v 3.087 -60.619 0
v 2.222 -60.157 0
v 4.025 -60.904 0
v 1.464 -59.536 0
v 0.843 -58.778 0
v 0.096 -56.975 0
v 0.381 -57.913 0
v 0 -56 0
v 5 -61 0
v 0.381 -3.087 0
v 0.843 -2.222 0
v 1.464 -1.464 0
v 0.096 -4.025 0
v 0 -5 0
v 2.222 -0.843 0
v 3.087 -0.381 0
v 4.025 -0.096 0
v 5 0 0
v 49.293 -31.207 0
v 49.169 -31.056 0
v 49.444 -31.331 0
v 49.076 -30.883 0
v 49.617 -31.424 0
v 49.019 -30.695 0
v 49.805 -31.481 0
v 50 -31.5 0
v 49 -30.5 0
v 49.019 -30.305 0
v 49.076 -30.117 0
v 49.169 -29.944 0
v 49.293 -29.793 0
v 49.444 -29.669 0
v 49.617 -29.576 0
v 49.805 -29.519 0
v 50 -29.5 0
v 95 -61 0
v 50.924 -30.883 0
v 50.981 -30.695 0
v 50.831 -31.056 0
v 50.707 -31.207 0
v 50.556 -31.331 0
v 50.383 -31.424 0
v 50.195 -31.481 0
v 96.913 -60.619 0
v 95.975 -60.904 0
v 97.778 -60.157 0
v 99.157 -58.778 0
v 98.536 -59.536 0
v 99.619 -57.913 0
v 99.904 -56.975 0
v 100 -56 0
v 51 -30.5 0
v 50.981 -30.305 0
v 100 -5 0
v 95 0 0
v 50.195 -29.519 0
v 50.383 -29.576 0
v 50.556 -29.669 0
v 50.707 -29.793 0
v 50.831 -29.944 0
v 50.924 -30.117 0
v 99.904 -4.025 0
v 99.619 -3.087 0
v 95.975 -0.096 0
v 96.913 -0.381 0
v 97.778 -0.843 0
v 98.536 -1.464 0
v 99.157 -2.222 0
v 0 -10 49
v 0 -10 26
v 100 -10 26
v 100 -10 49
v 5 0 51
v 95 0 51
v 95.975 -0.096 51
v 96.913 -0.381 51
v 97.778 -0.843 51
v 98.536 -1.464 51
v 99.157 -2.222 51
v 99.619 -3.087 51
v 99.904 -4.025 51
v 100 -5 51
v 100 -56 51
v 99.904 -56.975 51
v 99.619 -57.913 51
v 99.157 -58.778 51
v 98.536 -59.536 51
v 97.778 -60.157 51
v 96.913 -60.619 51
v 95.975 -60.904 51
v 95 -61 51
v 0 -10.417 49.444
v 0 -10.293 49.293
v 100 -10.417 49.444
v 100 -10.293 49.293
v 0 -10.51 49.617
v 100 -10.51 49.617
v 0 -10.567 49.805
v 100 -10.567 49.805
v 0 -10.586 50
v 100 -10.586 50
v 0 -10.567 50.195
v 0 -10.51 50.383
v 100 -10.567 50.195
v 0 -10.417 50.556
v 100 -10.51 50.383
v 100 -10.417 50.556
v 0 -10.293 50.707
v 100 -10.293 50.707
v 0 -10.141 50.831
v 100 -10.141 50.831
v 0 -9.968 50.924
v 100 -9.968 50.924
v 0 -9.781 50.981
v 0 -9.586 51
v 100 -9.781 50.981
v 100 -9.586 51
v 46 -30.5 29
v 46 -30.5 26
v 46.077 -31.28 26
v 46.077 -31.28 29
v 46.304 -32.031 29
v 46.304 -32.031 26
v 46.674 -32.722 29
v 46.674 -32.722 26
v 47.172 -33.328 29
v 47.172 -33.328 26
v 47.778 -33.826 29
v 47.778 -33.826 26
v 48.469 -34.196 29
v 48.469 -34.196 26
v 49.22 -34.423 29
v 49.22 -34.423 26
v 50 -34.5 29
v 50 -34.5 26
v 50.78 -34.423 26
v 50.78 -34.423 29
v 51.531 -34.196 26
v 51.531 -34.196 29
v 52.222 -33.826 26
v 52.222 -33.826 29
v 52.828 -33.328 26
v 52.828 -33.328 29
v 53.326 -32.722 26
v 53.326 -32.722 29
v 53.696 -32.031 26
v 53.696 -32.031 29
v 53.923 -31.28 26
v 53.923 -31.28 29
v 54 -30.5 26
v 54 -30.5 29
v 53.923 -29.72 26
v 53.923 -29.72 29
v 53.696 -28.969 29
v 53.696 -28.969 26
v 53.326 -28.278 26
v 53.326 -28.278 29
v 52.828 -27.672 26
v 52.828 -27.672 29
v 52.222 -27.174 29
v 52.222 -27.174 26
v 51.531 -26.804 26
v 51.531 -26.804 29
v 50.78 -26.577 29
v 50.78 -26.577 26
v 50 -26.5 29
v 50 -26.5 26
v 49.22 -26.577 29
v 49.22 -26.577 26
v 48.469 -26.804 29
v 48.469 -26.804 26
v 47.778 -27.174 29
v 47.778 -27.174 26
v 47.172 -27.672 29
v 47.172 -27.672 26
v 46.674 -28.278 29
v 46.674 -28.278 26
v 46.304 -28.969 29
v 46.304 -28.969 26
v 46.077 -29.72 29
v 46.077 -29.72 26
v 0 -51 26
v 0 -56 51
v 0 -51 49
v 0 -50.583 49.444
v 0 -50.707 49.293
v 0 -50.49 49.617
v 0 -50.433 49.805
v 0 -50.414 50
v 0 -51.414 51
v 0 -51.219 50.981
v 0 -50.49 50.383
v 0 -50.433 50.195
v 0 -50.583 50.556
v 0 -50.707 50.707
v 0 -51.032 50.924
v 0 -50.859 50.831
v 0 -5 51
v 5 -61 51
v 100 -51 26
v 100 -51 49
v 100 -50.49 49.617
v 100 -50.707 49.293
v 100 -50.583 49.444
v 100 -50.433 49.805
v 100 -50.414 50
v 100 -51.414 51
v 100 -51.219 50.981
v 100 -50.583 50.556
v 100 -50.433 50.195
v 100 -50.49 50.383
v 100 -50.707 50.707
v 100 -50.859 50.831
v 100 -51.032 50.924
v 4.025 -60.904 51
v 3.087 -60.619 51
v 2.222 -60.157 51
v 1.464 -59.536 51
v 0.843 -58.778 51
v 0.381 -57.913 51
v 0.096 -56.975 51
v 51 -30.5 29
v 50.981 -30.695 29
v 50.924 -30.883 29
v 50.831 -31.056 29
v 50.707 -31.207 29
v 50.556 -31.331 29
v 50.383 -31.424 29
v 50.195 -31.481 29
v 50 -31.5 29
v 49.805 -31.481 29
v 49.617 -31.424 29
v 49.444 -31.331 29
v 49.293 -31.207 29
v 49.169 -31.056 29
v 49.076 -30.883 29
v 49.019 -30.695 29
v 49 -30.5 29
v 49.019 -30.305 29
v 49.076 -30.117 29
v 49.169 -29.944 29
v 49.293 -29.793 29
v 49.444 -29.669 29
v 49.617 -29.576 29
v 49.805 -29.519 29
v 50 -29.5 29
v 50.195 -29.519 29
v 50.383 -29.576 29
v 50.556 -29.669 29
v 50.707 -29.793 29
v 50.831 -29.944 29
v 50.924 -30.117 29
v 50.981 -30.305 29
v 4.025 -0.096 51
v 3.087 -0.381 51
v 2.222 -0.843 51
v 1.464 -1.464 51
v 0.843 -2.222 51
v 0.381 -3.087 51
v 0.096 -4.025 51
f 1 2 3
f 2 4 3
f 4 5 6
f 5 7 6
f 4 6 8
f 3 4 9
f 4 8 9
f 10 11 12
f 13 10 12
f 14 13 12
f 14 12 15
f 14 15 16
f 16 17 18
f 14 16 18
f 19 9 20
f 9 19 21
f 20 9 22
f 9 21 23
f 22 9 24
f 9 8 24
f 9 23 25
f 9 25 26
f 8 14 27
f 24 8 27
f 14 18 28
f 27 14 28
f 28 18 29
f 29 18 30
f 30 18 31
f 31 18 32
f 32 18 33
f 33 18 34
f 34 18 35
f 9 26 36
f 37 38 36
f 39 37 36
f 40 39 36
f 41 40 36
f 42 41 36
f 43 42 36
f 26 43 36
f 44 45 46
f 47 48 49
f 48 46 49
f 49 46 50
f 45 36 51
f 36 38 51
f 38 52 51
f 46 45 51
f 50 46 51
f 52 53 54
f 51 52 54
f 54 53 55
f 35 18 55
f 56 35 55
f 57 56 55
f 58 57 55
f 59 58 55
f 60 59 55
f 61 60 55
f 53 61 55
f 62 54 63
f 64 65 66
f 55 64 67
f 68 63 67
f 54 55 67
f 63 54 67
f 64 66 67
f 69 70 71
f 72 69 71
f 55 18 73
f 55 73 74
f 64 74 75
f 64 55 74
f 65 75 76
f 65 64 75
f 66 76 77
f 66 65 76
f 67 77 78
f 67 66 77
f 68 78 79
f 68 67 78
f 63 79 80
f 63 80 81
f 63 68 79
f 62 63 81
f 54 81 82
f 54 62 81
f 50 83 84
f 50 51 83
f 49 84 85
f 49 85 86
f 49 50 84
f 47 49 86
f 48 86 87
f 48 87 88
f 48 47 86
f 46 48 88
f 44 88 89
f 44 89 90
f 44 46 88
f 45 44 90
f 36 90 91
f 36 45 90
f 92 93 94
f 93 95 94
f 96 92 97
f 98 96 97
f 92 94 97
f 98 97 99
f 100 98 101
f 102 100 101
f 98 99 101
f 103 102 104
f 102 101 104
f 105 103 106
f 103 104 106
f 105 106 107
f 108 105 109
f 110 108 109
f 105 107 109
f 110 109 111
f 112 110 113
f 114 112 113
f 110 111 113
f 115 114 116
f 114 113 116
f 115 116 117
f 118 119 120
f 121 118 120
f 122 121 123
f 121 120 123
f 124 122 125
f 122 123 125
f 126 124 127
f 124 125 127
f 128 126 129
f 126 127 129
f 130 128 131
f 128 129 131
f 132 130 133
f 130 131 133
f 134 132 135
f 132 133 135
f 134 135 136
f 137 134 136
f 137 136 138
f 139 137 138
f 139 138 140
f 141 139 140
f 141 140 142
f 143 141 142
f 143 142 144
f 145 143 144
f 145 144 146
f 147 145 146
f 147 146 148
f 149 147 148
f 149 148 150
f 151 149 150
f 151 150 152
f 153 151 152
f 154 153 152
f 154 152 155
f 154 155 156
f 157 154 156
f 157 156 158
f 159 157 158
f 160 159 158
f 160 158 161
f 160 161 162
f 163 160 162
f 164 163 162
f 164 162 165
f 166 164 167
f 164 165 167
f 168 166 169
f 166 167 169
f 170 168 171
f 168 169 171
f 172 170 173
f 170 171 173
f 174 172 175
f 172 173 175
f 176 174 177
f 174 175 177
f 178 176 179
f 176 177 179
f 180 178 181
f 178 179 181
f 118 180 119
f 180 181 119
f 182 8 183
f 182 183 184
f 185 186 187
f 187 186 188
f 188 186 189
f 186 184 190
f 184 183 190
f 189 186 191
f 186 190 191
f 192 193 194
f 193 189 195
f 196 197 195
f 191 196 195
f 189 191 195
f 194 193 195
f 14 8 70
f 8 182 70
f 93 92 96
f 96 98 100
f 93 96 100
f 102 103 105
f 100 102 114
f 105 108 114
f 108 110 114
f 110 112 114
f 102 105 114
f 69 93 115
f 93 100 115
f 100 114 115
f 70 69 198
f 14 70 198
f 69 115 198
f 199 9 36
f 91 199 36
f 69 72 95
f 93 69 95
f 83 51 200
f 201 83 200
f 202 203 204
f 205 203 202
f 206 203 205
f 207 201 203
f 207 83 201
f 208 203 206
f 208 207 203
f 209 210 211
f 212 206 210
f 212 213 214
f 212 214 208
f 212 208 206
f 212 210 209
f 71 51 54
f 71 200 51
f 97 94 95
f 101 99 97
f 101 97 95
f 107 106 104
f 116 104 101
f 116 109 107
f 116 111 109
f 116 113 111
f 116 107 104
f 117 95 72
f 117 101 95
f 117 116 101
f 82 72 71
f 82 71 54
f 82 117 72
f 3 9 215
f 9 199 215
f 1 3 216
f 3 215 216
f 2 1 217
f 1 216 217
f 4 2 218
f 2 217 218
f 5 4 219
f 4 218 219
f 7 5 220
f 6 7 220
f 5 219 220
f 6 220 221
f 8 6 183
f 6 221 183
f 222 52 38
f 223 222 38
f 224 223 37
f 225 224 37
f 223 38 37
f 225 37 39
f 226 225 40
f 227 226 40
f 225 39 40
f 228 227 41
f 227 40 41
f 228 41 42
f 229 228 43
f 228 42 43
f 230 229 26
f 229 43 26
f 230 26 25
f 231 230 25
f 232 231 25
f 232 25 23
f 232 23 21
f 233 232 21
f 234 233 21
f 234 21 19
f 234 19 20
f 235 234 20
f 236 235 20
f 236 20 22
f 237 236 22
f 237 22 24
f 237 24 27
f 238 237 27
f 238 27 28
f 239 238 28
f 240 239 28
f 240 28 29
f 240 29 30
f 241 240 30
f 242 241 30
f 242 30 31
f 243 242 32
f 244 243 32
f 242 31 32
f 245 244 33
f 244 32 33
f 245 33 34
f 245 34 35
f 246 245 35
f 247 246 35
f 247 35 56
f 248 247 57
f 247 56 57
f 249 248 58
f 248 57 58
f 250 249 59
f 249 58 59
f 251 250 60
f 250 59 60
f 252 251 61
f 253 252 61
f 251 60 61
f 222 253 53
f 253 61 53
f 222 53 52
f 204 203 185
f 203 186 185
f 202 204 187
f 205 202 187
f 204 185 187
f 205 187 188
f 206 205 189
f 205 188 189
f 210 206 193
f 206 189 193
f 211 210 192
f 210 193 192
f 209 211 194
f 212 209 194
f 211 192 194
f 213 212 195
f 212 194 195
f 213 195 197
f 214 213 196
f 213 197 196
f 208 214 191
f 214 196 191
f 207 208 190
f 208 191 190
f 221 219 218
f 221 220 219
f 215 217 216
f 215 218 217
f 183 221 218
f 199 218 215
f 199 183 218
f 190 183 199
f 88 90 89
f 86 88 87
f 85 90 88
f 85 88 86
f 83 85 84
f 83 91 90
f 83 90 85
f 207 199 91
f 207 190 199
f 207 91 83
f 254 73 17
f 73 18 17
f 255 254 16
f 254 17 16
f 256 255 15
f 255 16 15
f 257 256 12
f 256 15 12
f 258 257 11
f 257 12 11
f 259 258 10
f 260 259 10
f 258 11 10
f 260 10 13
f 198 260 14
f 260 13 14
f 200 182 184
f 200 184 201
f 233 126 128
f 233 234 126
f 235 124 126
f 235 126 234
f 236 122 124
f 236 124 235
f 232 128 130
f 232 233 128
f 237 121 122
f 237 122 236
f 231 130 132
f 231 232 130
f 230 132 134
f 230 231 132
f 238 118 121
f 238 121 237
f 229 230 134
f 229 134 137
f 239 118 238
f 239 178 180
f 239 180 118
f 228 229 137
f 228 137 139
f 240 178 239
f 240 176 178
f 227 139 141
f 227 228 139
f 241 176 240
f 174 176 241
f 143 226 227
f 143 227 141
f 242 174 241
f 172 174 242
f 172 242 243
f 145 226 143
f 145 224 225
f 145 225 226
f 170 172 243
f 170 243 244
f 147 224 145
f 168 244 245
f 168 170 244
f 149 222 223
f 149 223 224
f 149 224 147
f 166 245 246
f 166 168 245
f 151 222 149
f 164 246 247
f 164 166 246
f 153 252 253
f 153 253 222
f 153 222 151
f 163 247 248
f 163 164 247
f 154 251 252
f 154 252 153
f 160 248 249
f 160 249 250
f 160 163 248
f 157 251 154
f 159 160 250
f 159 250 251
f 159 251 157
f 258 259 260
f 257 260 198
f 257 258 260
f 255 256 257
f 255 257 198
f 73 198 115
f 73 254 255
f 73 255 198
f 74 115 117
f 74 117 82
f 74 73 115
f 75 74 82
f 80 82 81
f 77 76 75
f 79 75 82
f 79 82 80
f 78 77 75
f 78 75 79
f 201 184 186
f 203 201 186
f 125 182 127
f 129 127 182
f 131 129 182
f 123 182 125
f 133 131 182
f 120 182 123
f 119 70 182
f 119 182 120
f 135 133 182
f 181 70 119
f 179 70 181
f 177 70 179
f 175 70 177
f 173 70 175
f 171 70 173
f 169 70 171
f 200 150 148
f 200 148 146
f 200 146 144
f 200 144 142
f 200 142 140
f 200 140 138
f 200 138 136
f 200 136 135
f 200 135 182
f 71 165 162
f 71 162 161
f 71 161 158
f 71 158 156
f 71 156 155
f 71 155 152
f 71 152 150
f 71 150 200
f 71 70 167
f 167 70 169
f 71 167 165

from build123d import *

# Parameters (mm, degrees)
F0_W         = 100
F0_H         = 10
F1_DEPTH     = 51
F2_DEPTH     = 26
F3_DEPTH     = 29
F4_R         = 5
F5_W         = 100
F5_H         = 3
F6_DEPTH     = 2
F7_T4_DEPTH  = 115.4300979278
F8_W         = 100
F8_H         = 3
F9_DEPTH     = 2
F10_T4_DEPTH = 115.4300979278
F11_R        = 1


# Not quite as in the source:
# - a fillet or chamfer that OpenCascade refuses, or shapes differently, is made with other operations: its cross-section is extruded or revolved along the edge and cut away or added


with BuildPart() as f1:
    # F0 (on Top) → F1 (new body)
    with BuildSketch(Plane.XY):
        with Locations((50, -5)):
            Rectangle(F0_W, F0_H)
    extrude(amount=F1_DEPTH)



with BuildPart() as f1b:
    # F0 (on Top) → F1, piece 2 (new body)
    with BuildSketch(Plane.XY):
        with Locations((50, -56)):
            Rectangle(F0_W, F0_H)
    extrude(amount=F1_DEPTH)


with BuildPart() as f1_1:
    add(f1.part)

    add(f1b.part)  # F2 merges F1b
    # F0 (on Top) → F2 (join)
    with BuildSketch(Plane.XY):
        with Locations((50, -5)):
            Rectangle(F0_W, F0_H)
        with BuildLine():
            Line((100, -10), (0, -10))
            Line((0, -10), (0, -30.5))
            Line((0, -30.5), (46, -30.5))
            ThreePointArc((46, -30.5), (50, -26.5), (54, -30.5))
            Line((54, -30.5), (100, -30.5))
            Line((100, -30.5), (100, -10))
        make_face()
        with BuildLine():
            Line((46, -30.5), (0, -30.5))
            Line((0, -30.5), (0, -51))
            Line((0, -51), (100, -51))
            Line((100, -51), (100, -30.5))
            Line((100, -30.5), (54, -30.5))
            ThreePointArc((54, -30.5), (50, -34.5), (46, -30.5))
        make_face()
        with Locations((50, -56)):
            Rectangle(F0_W, F0_H)
        with BuildLine():
            ThreePointArc((54, -30.5), (50, -26.5), (46, -30.5))
            Line((46, -30.5), (49, -30.5))
            ThreePointArc((49, -30.5), (50, -29.5), (51, -30.5))
            Line((51, -30.5), (54, -30.5))
        make_face()
        with BuildLine():
            Line((49, -30.5), (46, -30.5))
            ThreePointArc((46, -30.5), (50, -34.5), (54, -30.5))
            Line((54, -30.5), (51, -30.5))
            ThreePointArc((51, -30.5), (50, -31.5), (49, -30.5))
        make_face()
    extrude(amount=F2_DEPTH)

    # F0 (on Top) → F3 (join)
    with BuildSketch(Plane.XY):
        with BuildLine():
            ThreePointArc((54, -30.5), (50, -26.5), (46, -30.5))
            Line((46, -30.5), (49, -30.5))
            ThreePointArc((49, -30.5), (50, -29.5), (51, -30.5))
            Line((51, -30.5), (54, -30.5))
        make_face()
        with BuildLine():
            Line((49, -30.5), (46, -30.5))
            ThreePointArc((46, -30.5), (50, -34.5), (54, -30.5))
            Line((54, -30.5), (51, -30.5))
            ThreePointArc((51, -30.5), (50, -31.5), (49, -30.5))
        make_face()
    extrude(amount=F3_DEPTH)

    # F4
    f4_edges = [f1_1.edges().sort_by_distance(p)[0] for p in [
        (100, 0, 25.5),
        (0, 0, 25.5),
        (100, -61, 25.5),
        (0, -61, 25.5),
    ]]
    fillet(f4_edges, radius=F4_R)

    # F5 (on face) → F6 (join)
    with BuildSketch(Plane.XY.offset(51)):
        with Locations((50, -11.5)):
            Rectangle(F5_W, F5_H)
    extrude(amount=-F6_DEPTH)

    # F7: chamfer of 3 on 1 edges, made by hand


with BuildPart() as f7_tool2:
    # F7_s3 → F7_t4 (new body)
    with BuildSketch(Plane.YZ.offset(-7.7150489639)):
        Polygon((-10, 49), (-13, 52), (-13, 49), align=None)
    extrude(amount=F7_T4_DEPTH)

    split(bisect_by=Plane.XZ.offset(10), keep=Keep.TOP)


with BuildPart() as f1_2:
    add(f1_1.part)

    # F7_t1: cut F7_tool2
    add(f7_tool2.part, mode=Mode.SUBTRACT)

    # F8 (on face) → F9 (join)
    with BuildSketch(Plane.XY.offset(51)):
        with Locations((50, -49.5)):
            Rectangle(F8_W, F8_H)
    extrude(amount=-F9_DEPTH)

    # F10: chamfer of 3 on 1 edges, made by hand


with BuildPart() as f10_tool2:
    # F10_s3 → F10_t4 (new body)
    with BuildSketch(Plane.YZ.offset(107.7150489639)):
        Polygon((-51, 49), (-48, 52), (-48, 49), align=None)
    extrude(amount=-F10_T4_DEPTH)

    split(bisect_by=Plane.XZ.offset(51), keep=Keep.BOTTOM)


with BuildPart() as f1_3:
    add(f1_2.part)

    # F10_t1: cut F10_tool2
    add(f10_tool2.part, mode=Mode.SUBTRACT)

    # F11
    f11_edges = [f1_3.edges().sort_by_distance(p)[0] for p in [
        (50, -12, 51),
        (50, -49, 51),
    ]]
    fillet(f11_edges, radius=F11_R)


solid = f1_3.part
